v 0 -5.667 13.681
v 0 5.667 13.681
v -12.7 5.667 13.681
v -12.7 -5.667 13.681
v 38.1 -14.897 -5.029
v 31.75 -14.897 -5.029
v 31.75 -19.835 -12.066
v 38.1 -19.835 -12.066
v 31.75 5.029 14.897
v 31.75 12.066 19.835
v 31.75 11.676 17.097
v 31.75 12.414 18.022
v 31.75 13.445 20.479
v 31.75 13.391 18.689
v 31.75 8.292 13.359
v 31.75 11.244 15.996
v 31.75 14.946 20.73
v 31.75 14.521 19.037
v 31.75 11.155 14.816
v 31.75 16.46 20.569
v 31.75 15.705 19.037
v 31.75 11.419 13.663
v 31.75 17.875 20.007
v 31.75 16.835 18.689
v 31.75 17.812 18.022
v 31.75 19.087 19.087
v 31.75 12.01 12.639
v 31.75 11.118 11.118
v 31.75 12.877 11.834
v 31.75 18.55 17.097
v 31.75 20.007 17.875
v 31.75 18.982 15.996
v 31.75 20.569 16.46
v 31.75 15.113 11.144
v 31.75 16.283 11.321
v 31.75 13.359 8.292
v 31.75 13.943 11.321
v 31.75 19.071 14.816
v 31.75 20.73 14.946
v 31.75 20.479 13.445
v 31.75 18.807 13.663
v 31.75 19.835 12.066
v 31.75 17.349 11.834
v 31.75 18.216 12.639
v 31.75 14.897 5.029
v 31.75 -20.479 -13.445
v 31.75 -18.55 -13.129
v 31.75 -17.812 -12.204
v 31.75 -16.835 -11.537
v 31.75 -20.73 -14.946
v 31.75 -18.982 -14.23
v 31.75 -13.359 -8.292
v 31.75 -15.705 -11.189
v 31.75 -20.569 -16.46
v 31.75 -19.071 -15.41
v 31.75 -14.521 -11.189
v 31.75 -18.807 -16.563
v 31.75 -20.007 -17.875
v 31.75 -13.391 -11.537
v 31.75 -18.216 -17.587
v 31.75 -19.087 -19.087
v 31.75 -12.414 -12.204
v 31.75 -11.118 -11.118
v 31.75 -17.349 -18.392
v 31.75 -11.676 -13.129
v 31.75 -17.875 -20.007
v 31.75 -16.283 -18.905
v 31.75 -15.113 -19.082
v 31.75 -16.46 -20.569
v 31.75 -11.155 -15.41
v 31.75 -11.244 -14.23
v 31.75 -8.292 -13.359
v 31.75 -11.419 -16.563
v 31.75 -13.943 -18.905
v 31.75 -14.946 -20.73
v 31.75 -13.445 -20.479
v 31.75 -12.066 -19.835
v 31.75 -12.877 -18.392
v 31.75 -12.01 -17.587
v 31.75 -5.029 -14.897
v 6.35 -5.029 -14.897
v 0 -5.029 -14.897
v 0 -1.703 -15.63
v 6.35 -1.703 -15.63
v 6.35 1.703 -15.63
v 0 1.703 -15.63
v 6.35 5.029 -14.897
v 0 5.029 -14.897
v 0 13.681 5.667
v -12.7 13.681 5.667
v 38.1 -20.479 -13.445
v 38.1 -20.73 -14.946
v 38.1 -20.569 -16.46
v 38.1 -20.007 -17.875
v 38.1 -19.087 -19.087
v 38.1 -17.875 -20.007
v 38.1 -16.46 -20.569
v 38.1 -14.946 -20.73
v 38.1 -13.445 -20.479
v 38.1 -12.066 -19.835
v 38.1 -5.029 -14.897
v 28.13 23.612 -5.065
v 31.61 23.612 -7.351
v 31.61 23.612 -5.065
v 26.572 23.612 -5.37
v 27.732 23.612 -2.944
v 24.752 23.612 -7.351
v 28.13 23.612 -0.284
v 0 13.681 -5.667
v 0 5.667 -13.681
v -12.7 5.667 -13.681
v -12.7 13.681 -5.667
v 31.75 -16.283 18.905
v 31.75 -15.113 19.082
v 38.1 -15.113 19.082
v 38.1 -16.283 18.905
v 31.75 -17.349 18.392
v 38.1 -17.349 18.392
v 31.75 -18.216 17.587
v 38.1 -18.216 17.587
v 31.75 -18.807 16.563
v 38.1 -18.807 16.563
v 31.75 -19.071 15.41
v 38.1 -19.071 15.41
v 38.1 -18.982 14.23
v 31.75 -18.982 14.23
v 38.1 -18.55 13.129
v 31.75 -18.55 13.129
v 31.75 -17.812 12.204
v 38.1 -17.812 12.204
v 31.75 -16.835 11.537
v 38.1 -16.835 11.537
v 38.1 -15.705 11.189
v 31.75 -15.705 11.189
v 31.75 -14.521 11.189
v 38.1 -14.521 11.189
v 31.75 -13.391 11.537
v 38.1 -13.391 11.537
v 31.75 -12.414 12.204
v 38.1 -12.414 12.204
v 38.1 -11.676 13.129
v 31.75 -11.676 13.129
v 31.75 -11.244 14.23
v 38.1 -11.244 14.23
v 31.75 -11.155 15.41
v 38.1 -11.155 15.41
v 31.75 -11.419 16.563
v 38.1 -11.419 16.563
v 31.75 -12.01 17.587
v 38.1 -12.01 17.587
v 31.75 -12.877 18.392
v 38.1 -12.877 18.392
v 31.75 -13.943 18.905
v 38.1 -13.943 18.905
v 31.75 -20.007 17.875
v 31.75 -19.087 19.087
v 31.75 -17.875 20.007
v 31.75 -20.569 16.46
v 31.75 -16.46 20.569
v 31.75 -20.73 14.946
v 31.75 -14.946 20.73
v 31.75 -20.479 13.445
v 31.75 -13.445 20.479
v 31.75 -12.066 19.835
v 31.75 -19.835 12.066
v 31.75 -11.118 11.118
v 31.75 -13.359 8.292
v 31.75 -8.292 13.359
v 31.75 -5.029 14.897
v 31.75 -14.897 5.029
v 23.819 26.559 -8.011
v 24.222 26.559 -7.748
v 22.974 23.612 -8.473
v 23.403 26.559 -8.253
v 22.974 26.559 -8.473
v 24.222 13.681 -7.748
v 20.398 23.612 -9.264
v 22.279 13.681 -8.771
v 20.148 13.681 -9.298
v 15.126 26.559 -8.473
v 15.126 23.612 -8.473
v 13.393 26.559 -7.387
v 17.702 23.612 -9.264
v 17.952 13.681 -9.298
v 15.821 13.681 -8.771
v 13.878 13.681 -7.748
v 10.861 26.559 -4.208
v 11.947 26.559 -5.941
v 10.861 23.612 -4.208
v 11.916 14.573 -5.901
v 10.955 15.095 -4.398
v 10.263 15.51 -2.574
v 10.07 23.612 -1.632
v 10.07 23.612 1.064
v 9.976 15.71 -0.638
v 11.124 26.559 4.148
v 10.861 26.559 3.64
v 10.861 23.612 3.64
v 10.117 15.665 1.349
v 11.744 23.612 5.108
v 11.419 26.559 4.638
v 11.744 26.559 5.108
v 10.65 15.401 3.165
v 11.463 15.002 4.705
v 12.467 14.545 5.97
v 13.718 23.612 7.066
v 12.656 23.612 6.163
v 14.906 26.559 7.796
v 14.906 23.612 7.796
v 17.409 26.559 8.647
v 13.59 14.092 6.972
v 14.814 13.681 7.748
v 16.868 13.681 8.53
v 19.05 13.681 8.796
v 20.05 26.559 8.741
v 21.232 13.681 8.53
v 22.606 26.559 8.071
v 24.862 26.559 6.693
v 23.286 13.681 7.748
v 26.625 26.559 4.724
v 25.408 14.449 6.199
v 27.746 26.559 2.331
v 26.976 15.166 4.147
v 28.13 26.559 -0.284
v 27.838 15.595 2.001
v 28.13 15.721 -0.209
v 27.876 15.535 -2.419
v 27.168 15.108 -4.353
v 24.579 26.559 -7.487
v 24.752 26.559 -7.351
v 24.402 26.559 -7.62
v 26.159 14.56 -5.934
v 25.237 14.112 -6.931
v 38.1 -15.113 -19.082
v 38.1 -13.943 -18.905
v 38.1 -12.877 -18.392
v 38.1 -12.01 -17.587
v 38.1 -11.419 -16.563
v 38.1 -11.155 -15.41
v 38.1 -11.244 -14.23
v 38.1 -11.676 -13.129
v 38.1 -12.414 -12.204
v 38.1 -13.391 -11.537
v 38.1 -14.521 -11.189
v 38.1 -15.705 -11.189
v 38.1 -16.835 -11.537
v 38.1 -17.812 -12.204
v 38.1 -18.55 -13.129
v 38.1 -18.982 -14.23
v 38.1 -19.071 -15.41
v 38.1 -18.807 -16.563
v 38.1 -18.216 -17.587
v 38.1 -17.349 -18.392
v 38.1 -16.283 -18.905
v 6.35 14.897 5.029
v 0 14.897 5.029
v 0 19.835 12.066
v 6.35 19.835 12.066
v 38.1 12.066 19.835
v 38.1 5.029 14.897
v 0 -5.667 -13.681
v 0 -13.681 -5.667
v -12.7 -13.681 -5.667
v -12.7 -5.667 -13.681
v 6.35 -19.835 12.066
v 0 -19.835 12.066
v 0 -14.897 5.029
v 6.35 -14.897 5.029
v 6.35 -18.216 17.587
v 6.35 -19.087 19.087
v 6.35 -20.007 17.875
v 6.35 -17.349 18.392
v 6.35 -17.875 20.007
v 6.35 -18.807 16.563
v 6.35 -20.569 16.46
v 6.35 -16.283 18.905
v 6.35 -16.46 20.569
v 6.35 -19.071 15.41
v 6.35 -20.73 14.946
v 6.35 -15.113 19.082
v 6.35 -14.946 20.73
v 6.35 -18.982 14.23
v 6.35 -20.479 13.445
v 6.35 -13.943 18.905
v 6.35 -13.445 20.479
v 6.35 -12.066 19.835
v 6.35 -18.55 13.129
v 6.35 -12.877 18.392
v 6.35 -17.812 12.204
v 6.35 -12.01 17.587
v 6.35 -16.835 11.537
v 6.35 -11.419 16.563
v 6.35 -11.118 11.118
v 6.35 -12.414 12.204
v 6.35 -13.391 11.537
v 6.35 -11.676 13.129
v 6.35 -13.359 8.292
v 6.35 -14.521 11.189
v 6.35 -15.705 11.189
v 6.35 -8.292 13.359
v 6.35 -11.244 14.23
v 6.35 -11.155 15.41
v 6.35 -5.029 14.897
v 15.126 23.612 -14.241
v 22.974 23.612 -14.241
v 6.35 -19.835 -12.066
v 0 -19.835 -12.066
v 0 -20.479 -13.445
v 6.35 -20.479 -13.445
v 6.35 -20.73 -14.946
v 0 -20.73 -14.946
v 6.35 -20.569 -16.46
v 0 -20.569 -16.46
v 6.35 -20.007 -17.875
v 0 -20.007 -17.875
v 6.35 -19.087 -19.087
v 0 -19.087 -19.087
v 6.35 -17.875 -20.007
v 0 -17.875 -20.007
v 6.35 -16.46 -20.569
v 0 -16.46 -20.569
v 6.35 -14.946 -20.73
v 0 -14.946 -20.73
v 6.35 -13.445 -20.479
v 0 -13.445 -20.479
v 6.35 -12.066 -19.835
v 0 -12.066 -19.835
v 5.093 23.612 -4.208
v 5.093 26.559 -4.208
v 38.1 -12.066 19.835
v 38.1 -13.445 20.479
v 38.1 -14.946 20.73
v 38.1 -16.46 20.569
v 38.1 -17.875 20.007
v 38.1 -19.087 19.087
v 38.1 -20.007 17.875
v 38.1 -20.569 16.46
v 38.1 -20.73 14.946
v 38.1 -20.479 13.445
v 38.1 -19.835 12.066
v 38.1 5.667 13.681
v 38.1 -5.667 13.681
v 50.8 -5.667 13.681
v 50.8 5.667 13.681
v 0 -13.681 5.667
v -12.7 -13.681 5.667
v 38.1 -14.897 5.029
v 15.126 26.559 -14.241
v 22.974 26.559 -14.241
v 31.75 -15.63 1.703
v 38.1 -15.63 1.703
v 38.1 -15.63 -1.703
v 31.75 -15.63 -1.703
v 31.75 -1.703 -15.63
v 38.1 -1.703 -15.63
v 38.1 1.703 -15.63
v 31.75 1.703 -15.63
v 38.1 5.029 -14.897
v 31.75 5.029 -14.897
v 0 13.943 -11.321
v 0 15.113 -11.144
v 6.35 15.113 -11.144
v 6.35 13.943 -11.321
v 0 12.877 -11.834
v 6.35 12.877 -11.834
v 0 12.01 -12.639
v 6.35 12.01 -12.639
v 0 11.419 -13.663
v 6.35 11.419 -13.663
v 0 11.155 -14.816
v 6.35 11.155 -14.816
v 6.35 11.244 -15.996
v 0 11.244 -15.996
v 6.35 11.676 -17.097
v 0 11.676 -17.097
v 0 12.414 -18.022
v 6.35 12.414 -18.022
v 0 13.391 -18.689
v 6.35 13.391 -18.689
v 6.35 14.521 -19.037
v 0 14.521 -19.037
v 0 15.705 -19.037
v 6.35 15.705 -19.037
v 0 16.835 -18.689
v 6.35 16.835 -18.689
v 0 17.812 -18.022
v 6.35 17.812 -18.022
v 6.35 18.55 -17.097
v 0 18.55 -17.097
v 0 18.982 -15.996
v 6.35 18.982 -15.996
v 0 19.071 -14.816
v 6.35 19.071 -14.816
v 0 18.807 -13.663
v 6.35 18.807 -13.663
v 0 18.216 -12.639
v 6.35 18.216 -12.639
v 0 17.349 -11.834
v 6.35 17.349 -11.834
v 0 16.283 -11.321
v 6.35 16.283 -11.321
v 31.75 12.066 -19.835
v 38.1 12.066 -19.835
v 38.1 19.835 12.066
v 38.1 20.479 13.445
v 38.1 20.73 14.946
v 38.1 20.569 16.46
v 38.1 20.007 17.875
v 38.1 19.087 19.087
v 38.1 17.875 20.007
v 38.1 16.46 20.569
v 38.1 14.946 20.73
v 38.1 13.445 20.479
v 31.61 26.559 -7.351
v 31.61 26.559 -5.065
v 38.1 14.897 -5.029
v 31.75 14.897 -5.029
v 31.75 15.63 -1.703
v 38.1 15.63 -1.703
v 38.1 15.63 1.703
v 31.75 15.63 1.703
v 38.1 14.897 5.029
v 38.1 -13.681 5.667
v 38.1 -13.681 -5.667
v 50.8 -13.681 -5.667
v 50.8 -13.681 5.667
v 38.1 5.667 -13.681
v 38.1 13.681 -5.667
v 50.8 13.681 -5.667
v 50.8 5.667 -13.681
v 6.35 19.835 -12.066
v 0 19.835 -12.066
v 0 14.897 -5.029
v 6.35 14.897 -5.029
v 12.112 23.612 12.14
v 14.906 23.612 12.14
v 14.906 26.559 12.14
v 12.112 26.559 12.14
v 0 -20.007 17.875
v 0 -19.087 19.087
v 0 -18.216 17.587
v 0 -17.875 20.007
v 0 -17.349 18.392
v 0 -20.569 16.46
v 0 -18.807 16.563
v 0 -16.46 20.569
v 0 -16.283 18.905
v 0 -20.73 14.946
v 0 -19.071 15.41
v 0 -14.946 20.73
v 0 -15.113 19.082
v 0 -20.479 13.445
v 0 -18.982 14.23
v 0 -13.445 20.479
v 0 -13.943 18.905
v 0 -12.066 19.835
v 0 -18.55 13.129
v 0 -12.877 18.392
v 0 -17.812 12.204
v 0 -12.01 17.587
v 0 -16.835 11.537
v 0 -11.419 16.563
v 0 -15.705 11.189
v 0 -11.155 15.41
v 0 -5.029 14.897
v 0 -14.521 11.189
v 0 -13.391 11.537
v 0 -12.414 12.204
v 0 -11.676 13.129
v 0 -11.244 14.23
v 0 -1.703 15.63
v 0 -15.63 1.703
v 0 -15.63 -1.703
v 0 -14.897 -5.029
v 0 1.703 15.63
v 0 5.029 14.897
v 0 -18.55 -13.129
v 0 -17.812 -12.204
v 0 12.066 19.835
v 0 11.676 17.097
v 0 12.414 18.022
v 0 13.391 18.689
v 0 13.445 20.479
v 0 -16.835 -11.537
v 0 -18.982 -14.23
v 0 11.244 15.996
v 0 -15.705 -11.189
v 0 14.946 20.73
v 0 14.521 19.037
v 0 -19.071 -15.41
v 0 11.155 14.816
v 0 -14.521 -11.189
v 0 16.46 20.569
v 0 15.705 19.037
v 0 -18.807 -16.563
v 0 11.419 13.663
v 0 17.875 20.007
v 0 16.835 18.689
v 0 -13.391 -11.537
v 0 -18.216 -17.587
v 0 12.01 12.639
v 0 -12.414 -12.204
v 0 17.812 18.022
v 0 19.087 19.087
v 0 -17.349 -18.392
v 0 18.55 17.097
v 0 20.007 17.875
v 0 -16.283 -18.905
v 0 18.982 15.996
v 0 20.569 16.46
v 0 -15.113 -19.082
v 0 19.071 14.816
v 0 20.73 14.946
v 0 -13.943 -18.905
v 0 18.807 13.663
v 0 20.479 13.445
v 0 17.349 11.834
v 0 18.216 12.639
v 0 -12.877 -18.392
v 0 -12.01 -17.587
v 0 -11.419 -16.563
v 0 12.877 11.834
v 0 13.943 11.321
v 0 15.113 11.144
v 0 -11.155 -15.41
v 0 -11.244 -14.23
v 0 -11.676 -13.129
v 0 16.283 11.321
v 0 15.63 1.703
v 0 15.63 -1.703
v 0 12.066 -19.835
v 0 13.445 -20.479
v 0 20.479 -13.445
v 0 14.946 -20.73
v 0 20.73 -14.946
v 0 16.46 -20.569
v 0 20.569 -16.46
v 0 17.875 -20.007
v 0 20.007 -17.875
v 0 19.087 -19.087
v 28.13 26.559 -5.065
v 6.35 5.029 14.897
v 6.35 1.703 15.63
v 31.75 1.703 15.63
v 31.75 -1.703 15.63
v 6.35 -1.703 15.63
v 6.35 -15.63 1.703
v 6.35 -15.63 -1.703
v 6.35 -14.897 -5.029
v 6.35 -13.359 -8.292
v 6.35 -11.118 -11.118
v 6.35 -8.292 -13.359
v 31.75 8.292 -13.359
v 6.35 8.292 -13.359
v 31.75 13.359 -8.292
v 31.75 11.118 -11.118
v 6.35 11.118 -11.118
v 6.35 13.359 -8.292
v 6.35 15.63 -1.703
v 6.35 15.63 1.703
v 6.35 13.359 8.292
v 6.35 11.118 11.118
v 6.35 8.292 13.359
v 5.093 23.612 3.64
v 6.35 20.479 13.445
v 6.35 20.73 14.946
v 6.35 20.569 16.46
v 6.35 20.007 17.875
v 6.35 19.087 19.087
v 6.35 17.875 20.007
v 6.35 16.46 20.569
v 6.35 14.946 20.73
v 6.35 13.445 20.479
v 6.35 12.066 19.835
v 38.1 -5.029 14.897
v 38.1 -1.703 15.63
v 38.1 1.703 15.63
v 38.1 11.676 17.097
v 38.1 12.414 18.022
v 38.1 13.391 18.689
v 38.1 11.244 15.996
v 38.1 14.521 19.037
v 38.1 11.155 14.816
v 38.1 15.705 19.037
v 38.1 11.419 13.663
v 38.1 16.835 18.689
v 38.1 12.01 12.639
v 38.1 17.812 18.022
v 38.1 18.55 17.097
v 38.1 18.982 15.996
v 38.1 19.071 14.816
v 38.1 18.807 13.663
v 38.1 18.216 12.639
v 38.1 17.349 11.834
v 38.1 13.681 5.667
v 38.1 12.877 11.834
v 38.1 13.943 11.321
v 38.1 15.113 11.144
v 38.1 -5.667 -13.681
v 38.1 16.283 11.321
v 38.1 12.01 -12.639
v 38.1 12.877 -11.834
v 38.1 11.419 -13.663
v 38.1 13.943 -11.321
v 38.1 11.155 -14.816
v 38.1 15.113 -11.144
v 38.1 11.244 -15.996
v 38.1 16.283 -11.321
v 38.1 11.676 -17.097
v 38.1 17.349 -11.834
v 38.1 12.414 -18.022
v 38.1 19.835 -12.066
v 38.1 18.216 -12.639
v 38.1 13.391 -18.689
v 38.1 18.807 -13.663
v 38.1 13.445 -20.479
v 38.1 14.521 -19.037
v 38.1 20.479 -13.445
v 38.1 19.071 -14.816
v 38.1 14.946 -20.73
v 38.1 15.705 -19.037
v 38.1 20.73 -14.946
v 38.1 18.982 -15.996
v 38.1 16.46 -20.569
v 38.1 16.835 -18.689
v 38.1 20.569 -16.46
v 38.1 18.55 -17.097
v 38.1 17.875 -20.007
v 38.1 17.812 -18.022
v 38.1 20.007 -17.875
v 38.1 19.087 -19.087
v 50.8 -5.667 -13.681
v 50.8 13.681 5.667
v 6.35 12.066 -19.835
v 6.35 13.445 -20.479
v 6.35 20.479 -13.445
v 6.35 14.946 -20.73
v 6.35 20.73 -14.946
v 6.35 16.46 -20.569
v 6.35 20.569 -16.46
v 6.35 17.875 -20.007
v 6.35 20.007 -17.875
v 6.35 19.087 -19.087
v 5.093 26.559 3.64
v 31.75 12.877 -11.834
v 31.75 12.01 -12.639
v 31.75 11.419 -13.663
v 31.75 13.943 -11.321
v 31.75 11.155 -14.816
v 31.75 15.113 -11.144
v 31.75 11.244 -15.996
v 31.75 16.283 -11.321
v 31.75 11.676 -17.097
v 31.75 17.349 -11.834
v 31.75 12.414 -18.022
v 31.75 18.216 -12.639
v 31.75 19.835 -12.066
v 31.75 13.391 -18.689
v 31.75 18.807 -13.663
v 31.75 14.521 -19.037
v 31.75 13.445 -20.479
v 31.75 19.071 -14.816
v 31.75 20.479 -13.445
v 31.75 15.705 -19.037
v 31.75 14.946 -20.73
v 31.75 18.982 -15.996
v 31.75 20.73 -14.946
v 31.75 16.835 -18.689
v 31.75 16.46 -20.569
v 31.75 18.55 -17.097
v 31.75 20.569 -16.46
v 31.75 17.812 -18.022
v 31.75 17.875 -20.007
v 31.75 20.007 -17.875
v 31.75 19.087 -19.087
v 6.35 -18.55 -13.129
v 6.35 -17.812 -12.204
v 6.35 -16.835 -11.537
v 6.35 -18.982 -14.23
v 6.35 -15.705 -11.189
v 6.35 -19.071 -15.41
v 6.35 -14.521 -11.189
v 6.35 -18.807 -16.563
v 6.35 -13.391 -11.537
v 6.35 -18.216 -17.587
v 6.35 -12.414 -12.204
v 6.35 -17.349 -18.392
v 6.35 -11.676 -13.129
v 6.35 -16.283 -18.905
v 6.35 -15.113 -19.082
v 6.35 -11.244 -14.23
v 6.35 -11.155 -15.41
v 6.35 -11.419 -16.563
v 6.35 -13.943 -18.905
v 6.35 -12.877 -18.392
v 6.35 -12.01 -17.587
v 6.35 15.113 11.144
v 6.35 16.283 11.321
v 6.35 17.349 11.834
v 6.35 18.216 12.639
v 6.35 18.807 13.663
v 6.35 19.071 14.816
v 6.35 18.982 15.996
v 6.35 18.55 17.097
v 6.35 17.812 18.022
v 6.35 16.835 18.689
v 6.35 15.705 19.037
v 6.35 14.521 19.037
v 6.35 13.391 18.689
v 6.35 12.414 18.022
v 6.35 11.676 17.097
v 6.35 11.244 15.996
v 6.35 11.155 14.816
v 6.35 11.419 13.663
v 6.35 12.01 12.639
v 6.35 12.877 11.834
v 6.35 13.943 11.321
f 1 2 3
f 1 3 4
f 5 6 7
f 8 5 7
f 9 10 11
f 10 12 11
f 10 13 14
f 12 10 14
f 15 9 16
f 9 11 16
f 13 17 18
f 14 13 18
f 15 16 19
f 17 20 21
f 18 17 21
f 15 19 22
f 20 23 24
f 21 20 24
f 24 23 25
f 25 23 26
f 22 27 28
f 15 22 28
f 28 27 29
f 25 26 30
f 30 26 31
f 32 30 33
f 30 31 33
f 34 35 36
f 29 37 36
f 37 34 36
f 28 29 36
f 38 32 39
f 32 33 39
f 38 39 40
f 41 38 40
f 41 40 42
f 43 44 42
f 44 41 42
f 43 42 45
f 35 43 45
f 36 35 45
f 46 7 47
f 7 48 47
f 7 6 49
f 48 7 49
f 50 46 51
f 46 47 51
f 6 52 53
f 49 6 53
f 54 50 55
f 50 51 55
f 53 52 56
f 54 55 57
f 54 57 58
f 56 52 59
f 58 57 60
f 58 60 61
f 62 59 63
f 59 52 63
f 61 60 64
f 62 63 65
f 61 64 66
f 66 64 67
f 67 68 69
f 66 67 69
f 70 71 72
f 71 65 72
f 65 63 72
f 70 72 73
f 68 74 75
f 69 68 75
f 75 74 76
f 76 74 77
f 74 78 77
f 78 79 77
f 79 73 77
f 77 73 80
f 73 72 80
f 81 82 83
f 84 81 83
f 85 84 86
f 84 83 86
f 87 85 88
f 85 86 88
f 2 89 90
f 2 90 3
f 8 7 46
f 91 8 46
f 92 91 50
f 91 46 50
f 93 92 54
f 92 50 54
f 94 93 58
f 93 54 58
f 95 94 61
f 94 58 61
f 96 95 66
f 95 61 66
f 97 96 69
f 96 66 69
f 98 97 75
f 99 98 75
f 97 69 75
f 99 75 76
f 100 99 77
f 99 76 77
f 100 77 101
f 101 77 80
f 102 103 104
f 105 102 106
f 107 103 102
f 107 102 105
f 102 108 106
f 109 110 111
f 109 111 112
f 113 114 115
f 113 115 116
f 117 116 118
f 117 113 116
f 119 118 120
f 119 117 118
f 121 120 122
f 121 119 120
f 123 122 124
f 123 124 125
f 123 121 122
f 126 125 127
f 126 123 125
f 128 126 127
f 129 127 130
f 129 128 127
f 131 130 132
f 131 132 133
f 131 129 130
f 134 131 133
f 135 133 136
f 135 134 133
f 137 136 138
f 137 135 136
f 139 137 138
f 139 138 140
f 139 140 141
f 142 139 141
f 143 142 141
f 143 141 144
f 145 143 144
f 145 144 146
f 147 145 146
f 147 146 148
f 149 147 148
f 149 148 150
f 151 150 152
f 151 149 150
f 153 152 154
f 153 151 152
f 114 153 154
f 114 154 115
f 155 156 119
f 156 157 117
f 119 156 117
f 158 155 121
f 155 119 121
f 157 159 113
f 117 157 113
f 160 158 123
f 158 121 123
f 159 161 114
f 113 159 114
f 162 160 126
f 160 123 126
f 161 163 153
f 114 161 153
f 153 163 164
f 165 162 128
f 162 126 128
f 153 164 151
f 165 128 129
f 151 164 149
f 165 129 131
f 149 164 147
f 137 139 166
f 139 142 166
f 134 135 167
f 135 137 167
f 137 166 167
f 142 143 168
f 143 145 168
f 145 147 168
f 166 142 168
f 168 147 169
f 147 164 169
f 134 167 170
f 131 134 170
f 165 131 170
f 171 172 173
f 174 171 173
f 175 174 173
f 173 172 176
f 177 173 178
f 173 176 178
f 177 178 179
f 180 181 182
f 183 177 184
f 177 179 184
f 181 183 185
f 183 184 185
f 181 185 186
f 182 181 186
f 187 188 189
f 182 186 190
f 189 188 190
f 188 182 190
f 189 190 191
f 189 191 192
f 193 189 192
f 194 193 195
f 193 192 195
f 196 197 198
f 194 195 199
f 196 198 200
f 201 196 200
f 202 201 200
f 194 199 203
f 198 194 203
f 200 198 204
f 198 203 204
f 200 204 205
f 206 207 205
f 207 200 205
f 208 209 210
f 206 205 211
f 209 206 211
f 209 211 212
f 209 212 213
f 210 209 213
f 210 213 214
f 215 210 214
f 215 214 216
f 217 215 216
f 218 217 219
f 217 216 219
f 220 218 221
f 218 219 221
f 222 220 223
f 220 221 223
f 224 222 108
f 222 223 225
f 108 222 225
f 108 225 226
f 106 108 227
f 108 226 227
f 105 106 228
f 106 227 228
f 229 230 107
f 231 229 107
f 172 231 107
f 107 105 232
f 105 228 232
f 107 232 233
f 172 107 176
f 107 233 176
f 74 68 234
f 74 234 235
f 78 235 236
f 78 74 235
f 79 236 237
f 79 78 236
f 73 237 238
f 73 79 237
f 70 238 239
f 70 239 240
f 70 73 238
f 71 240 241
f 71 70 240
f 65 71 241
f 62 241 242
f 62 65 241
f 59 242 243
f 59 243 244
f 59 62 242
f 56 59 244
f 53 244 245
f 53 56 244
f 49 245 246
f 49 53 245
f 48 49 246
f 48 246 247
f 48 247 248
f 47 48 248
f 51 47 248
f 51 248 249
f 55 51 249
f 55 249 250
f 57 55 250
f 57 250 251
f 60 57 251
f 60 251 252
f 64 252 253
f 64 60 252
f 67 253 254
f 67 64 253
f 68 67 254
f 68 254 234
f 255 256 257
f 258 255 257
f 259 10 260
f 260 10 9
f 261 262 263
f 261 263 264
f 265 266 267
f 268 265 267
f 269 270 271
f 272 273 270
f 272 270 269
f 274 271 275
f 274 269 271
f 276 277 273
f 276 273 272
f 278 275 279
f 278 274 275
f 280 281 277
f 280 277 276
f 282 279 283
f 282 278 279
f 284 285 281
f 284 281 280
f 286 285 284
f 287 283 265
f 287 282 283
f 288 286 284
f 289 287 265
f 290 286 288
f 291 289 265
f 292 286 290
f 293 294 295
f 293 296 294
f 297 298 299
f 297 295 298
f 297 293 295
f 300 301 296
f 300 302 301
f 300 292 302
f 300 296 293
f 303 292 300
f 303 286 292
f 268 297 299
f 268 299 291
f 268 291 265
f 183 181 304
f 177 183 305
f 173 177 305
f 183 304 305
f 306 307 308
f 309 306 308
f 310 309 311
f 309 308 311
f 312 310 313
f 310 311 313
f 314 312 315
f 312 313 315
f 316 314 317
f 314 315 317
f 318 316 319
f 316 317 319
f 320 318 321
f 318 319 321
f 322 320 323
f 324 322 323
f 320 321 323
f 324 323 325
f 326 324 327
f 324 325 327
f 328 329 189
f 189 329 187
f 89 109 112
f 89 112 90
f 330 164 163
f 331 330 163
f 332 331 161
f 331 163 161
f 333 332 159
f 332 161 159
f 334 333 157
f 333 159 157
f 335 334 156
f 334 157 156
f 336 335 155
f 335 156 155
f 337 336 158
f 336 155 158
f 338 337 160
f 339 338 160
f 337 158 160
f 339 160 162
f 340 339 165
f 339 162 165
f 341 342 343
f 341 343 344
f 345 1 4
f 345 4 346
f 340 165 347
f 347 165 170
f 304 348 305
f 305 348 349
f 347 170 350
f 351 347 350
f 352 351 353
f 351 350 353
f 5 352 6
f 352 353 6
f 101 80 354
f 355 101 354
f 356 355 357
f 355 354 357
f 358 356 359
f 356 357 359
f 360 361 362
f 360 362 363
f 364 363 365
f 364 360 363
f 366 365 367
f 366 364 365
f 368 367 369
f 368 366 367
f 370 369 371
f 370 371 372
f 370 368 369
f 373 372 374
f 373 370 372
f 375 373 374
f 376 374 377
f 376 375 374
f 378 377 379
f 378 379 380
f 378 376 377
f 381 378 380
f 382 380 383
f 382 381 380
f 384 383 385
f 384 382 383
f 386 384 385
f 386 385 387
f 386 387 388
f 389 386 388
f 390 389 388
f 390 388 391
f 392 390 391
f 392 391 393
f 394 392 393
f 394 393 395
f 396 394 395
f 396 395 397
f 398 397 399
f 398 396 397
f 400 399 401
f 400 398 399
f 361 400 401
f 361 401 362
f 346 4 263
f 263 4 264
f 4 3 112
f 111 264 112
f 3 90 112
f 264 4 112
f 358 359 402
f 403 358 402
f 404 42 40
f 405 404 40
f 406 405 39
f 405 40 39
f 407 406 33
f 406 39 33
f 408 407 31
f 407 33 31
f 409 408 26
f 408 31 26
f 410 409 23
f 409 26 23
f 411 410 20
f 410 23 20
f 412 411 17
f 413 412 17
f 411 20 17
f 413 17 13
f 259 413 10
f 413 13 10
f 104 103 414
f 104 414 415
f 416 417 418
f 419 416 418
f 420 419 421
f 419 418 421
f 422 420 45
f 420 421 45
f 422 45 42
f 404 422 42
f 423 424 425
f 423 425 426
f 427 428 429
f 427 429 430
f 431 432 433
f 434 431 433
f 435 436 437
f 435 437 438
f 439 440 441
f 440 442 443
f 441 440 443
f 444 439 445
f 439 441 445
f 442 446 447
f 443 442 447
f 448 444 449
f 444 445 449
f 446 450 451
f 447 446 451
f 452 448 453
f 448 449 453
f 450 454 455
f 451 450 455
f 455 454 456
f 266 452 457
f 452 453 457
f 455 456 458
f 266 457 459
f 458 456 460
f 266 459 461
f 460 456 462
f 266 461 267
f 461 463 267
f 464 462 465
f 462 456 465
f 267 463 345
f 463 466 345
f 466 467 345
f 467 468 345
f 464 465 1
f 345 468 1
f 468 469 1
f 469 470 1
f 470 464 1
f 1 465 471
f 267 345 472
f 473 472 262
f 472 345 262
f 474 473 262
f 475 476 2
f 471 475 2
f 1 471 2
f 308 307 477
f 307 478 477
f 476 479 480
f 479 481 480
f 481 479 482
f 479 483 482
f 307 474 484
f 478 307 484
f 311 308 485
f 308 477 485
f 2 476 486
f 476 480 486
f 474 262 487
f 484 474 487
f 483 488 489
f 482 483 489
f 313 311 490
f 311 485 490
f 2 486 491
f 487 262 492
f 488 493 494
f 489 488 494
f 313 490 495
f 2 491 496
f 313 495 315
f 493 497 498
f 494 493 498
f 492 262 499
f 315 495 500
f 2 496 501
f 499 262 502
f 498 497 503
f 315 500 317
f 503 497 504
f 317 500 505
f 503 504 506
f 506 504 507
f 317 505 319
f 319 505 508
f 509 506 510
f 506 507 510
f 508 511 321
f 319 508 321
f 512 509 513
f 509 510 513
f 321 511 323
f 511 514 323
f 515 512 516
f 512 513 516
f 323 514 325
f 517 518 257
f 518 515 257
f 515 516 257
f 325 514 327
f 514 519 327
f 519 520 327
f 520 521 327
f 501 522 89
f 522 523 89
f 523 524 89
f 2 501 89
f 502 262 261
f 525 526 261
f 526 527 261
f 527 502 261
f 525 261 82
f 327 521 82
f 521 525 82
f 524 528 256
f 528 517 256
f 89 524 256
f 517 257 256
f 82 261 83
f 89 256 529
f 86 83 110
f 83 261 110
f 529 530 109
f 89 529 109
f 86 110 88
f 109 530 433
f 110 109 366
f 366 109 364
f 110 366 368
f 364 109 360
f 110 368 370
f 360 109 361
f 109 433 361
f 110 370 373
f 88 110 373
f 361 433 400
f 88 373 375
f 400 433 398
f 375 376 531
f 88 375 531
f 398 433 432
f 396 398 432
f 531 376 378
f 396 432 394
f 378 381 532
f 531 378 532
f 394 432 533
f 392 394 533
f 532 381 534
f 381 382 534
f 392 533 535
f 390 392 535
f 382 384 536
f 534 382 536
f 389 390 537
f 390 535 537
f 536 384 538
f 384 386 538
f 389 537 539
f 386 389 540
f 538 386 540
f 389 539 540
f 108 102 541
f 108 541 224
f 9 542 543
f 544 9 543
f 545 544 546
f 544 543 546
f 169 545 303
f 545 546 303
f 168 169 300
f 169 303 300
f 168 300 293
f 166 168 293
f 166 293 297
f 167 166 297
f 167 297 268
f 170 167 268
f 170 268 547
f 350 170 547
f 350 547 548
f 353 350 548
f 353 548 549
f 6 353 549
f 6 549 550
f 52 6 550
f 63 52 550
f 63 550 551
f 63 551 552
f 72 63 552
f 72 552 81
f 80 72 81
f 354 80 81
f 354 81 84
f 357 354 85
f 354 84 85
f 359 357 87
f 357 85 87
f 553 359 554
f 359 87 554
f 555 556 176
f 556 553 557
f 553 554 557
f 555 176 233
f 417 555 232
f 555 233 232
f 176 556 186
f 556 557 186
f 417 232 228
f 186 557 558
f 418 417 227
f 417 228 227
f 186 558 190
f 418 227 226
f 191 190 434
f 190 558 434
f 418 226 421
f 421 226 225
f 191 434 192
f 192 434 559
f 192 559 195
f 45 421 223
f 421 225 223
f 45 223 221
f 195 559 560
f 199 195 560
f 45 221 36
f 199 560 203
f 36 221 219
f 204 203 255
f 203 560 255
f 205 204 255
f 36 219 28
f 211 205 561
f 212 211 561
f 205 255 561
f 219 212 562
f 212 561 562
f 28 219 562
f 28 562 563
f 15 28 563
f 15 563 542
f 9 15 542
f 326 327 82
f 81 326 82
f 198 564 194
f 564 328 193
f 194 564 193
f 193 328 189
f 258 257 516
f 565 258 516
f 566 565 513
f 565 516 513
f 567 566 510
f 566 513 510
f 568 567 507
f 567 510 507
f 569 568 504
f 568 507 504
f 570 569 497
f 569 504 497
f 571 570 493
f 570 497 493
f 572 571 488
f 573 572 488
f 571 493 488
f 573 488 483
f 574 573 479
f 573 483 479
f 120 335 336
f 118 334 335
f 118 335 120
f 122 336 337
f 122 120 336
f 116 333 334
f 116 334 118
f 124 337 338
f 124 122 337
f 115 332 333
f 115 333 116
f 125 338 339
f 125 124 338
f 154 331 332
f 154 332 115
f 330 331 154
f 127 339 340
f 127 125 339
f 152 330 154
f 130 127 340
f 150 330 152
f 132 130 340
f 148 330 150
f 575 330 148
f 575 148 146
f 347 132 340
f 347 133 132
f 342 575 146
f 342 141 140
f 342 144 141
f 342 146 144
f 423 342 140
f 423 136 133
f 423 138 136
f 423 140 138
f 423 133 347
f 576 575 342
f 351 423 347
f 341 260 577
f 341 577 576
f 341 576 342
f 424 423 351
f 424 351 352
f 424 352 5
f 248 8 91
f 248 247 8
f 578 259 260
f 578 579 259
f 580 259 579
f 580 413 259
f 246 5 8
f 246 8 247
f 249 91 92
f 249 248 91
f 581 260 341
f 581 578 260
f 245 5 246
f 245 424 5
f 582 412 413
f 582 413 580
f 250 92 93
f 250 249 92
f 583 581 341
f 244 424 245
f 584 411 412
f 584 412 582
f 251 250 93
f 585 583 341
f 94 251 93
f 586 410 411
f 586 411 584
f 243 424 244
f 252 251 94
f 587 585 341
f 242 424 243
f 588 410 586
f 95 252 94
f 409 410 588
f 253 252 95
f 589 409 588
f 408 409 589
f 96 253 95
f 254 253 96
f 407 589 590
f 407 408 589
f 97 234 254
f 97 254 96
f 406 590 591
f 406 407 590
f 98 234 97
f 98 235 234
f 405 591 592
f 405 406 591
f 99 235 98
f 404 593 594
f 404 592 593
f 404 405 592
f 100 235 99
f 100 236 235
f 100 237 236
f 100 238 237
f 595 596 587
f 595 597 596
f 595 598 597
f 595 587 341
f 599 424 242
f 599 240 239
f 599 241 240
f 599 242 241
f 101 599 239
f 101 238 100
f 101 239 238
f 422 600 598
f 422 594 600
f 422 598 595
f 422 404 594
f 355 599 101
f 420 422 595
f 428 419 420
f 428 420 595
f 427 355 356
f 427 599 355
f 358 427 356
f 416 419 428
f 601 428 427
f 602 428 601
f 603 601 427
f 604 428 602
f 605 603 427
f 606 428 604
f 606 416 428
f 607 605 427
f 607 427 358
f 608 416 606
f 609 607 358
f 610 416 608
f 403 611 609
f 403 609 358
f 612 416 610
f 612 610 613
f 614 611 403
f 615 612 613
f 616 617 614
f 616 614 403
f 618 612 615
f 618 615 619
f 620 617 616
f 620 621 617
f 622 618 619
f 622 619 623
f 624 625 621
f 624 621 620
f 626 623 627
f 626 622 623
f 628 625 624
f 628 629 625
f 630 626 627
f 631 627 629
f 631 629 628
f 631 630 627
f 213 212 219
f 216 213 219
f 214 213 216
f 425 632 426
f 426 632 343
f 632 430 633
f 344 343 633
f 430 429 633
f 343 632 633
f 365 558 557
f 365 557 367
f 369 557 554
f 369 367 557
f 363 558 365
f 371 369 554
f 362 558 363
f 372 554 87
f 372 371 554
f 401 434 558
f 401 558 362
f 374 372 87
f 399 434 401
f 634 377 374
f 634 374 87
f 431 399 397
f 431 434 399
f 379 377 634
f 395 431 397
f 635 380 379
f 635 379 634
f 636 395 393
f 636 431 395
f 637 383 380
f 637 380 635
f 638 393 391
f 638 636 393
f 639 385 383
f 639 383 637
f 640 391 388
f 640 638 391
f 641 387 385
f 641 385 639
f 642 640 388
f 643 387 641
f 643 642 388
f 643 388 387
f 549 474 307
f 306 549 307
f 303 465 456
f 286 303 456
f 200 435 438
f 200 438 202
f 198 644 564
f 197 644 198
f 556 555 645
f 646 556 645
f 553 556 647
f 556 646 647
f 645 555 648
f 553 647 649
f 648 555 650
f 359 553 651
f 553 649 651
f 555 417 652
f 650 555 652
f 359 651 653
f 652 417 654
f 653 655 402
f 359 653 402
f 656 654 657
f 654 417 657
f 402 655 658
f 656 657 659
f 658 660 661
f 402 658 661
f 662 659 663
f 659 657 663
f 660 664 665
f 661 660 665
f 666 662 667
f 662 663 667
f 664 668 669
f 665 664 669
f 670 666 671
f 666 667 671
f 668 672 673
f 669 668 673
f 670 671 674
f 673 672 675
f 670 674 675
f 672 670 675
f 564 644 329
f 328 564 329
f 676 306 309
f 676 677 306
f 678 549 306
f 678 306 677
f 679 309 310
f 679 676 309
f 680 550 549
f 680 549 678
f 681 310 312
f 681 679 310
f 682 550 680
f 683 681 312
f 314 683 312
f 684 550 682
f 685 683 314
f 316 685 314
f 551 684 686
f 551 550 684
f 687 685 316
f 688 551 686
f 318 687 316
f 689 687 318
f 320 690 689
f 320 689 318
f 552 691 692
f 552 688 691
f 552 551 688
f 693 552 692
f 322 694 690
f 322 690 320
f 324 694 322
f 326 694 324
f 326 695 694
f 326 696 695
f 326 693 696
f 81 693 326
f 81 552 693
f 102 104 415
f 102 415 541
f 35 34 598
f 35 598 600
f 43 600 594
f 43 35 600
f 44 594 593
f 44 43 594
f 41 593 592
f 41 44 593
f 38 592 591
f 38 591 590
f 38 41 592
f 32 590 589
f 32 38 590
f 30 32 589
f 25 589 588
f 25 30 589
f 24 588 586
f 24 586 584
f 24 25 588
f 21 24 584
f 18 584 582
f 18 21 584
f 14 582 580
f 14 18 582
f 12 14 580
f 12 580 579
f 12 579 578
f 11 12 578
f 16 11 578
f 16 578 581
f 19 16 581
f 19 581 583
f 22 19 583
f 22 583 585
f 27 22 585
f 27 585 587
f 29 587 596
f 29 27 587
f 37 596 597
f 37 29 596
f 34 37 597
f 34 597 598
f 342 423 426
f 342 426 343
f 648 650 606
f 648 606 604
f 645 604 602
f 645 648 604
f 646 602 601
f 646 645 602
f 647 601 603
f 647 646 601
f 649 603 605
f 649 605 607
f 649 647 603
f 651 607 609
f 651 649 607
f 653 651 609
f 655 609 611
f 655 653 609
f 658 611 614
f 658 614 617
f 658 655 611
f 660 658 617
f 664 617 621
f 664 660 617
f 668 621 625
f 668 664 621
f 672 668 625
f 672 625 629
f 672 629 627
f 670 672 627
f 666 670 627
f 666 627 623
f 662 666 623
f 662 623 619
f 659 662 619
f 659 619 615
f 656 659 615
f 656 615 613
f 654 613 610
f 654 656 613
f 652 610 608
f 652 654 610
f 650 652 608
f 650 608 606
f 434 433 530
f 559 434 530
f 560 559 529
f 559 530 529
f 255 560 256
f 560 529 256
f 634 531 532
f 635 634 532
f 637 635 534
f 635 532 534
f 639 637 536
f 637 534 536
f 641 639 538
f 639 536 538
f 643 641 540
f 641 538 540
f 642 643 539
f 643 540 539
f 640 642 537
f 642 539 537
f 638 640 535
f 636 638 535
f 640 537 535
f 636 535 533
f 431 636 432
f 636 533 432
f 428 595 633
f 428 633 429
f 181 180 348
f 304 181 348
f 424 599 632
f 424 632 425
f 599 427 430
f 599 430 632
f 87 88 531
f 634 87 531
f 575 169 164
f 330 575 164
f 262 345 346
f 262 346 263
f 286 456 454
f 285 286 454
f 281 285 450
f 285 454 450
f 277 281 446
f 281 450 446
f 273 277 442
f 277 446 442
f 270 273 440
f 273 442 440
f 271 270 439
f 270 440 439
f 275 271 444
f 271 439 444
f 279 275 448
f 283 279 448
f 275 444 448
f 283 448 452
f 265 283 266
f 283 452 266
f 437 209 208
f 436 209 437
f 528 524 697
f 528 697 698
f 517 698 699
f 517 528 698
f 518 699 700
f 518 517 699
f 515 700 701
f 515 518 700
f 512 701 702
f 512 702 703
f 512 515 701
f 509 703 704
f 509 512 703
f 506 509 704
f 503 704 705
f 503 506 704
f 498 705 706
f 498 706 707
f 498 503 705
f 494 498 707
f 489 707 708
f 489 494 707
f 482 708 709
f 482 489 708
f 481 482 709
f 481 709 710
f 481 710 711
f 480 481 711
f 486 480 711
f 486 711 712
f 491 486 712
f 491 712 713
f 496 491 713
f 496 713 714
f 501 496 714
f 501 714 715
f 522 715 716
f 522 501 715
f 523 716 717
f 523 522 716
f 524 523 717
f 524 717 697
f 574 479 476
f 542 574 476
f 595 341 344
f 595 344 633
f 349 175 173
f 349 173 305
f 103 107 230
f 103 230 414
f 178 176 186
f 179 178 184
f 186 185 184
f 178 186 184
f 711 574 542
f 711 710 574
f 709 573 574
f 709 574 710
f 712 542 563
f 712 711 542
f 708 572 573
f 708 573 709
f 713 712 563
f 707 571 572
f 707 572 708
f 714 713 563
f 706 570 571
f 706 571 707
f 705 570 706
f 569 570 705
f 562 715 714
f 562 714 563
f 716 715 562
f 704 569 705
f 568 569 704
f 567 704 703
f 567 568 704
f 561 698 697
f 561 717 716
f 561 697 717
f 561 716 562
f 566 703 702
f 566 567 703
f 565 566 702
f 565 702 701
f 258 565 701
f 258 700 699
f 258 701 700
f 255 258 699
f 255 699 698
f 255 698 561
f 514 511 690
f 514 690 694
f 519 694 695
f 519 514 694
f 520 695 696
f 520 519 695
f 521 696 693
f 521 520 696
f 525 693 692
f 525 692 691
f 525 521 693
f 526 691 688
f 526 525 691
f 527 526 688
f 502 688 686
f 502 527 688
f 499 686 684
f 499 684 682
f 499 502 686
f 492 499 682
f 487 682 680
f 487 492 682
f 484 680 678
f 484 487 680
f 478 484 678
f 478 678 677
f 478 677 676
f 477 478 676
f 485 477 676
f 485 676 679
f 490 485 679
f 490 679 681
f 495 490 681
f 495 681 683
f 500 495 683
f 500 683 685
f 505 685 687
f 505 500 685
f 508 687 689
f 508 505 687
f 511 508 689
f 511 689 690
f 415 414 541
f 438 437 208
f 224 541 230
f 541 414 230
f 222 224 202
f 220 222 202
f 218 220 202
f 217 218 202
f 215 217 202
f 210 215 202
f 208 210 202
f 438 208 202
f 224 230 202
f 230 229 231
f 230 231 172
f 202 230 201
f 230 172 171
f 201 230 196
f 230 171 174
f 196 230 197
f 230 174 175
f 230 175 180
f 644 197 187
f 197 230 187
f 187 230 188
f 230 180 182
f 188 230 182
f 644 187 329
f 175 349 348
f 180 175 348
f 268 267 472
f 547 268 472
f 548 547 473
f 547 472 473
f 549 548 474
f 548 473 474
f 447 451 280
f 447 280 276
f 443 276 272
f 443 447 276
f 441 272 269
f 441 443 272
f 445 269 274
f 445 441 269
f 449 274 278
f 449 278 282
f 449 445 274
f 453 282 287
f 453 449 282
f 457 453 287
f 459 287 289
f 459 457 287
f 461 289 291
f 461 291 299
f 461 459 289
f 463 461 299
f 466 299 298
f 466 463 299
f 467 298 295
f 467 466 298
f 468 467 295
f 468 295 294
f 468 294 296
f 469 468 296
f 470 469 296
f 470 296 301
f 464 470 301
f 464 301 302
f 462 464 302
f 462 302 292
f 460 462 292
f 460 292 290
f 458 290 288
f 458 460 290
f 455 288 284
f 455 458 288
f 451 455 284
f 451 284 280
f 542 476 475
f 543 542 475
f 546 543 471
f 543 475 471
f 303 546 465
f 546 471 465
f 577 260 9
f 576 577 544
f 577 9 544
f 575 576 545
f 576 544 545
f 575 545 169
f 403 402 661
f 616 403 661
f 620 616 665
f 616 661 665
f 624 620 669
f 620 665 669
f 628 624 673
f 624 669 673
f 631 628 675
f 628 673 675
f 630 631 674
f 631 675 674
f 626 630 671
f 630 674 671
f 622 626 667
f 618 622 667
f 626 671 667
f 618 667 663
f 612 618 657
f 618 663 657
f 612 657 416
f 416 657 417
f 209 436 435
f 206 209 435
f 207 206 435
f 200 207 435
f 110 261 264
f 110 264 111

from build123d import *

# Parameters (mm, degrees)
SKETCH1_R            = 3.96875
BOSS_EXTRUDE2_DEPTH  = 6.35
BOSS_EXTRUDE3_DEPTH  = 12.7
SKETCH3_R            = 15.7226
BOSS_EXTRUDE4_DEPTH  = 25.4
SKETCH4_R            = 3.96875
BOSS_EXTRUDE5_DEPTH  = 6.35
BOSS_EXTRUDE6_DEPTH  = 12.7
SKETCH6_R            = 9.0805
BOSS_EXTRUDE8_DEPTH  = 12.8778
SKETCH8_W            = 7.8486
SKETCH8_H            = 8.0772
SKETCH8_W_2          = 8.0772
SKETCH8_H_2          = 7.8486
BOSS_EXTRUDE9_DEPTH  = 2.9464
BOSS_EXTRUDE10_START = -2.9464
BOSS_EXTRUDE10_DEPTH = 2.9464


with BuildPart() as part:
    # Sketch1 → Boss-Extrude2 (new body)
    with BuildSketch(Plane(origin=(0, 0, 0), x_dir=(0, 0, -1), z_dir=(1, 0, 0))):
        with BuildLine():
            Line((-19.834703053, 12.065523939), (-14.896576623, 5.029130709))
            ThreePointArc((-14.896576623, 5.029130709), (-15.7226, 0), (-14.896576623, -5.029130709))
            Line((-14.896576623, -5.029130709), (-19.834703053, -12.065523939))
            ThreePointArc((-19.834703053, -12.065523939), (-19.086763334, -19.086763334), (-12.065523939, -19.834703053))
            Line((-12.065523939, -19.834703053), (-5.029130709, -14.896576623))
            ThreePointArc((-5.029130709, -14.896576623), (0, -15.7226), (5.029130709, -14.896576623))
            Line((5.029130709, -14.896576623), (12.065523939, -19.834703053))
            ThreePointArc((12.065523939, -19.834703053), (19.086763334, -19.086763334), (19.834703053, -12.065523939))
            Line((19.834703053, -12.065523939), (14.896576623, -5.029130709))
            ThreePointArc((14.896576623, -5.029130709), (15.7226, 0), (14.896576623, 5.029130709))
            Line((14.896576623, 5.029130709), (19.834703053, 12.065523939))
            ThreePointArc((19.834703053, 12.065523939), (19.086763334, 19.086763334), (12.065523939, 19.834703053))
            Line((12.065523939, 19.834703053), (5.029130709, 14.896576623))
            ThreePointArc((5.029130709, 14.896576623), (0, 15.7226), (-5.029130709, 14.896576623))
            Line((-5.029130709, 14.896576623), (-12.065523939, 19.834703053))
            ThreePointArc((-12.065523939, 19.834703053), (-19.086763334, 19.086763334), (-19.834703053, 12.065523939))
        make_face()
        with Locations((-15.113, 15.113)):
            Circle(SKETCH1_R, mode=Mode.SUBTRACT)
        with Locations(Location((15.113, 15.113, 0), (0, 0, 180))):
            Circle(SKETCH1_R, mode=Mode.SUBTRACT)
        with Locations((15.113, -15.113)):
            Circle(SKETCH1_R, mode=Mode.SUBTRACT)
        with Locations(Location((-15.113, -15.113, 0), (0, 0, 180))):
            Circle(SKETCH1_R, mode=Mode.SUBTRACT)
    extrude(amount=BOSS_EXTRUDE2_DEPTH)

    # Sketch2 → Boss-Extrude3 (add)
    with BuildSketch(Plane.ZY):
        Polygon((13.680992893, 5.666852803), (13.680992893, -5.666852803), (5.666852803, -13.680992893), (-5.666852803, -13.680992893), (-13.680992893, -5.666852803), (-13.680992893, 5.666852803), (-5.666852803, 13.680992893), (5.666852803, 13.680992893), align=None)
    extrude(amount=BOSS_EXTRUDE3_DEPTH)

    # Sketch3 → Boss-Extrude4 (add)
    with BuildSketch(Plane(origin=(6.35, 0, 0), x_dir=(0, 0, -1), z_dir=(1, 0, 0))):
        with Locations(Location((0, 0, 0), (0, 0, 161.345157372))):
            Circle(SKETCH3_R)
    extrude(amount=BOSS_EXTRUDE4_DEPTH)

    # Sketch4 → Boss-Extrude5 (add)
    with BuildSketch(Plane(origin=(31.75, 0, 0), x_dir=(0, 0, -1), z_dir=(1, 0, 0))):
        with BuildLine():
            Line((-19.834703053, 12.065523939), (-14.896576623, 5.029130709))
            ThreePointArc((-14.896576623, 5.029130709), (-15.7226, 0), (-14.896576623, -5.029130709))
            Line((-14.896576623, -5.029130709), (-19.834703053, -12.065523939))
            ThreePointArc((-19.834703053, -12.065523939), (-19.086763334, -19.086763334), (-12.065523939, -19.834703053))
            Line((-12.065523939, -19.834703053), (-5.029130709, -14.896576623))
            ThreePointArc((-5.029130709, -14.896576623), (0, -15.7226), (5.029130709, -14.896576623))
            Line((5.029130709, -14.896576623), (12.065523939, -19.834703053))
            ThreePointArc((12.065523939, -19.834703053), (19.086763334, -19.086763334), (19.834703053, -12.065523939))
            Line((19.834703053, -12.065523939), (14.896576623, -5.029130709))
            ThreePointArc((14.896576623, -5.029130709), (15.7226, 0), (14.896576623, 5.029130709))
            Line((14.896576623, 5.029130709), (19.834703053, 12.065523939))
            ThreePointArc((19.834703053, 12.065523939), (19.086763334, 19.086763334), (12.065523939, 19.834703053))
            Line((12.065523939, 19.834703053), (5.029130709, 14.896576623))
            ThreePointArc((5.029130709, 14.896576623), (0, 15.7226), (-5.029130709, 14.896576623))
            Line((-5.029130709, 14.896576623), (-12.065523939, 19.834703053))
            ThreePointArc((-12.065523939, 19.834703053), (-19.086763334, 19.086763334), (-19.834703053, 12.065523939))
        make_face()
        with Locations((-15.113, 15.113)):
            Circle(SKETCH4_R, mode=Mode.SUBTRACT)
        with Locations(Location((15.113, 15.113, 0), (0, 0, 180))):
            Circle(SKETCH4_R, mode=Mode.SUBTRACT)
        with Locations((15.113, -15.113)):
            Circle(SKETCH4_R, mode=Mode.SUBTRACT)
        with Locations(Location((-15.113, -15.113, 0), (0, 0, 180))):
            Circle(SKETCH4_R, mode=Mode.SUBTRACT)
    extrude(amount=BOSS_EXTRUDE5_DEPTH)

    # Sketch5 → Boss-Extrude6 (add)
    with BuildSketch(Plane(origin=(38.1, 0, 0), x_dir=(0, 0, -1), z_dir=(1, 0, 0))):
        Polygon((13.680992893, 5.666852803), (13.680992893, -5.666852803), (5.666852803, -13.680992893), (-5.666852803, -13.680992893), (-13.680992893, -5.666852803), (-13.680992893, 5.666852803), (-5.666852803, 13.680992893), (5.666852803, 13.680992893), align=None)
    extrude(amount=BOSS_EXTRUDE6_DEPTH)

    # Sketch6 → Boss-Extrude8 (add)
    with BuildSketch(Plane(origin=(0, 13.680992893, 0), x_dir=(1, 0, 0), z_dir=(0, 1, 0))):
        with Locations(Location((19.05, 0.284018035, 0), (0, 0, 55.282753466))):
            Circle(SKETCH6_R)
    extrude(amount=BOSS_EXTRUDE8_DEPTH)

    # Sketch8 → Boss-Extrude9 (add)
    with BuildSketch(Plane(origin=(0, 26.558792893, 0), x_dir=(1, 0, 0), z_dir=(0, 1, 0))):
        with Locations((19.05, 10.202718035)):
            Rectangle(SKETCH8_W, SKETCH8_H)
        with Locations((9.1313, 0.284018035)):
            Rectangle(SKETCH8_W_2, SKETCH8_H_2)
    extrude(amount=-BOSS_EXTRUDE9_DEPTH)

    # Sketch10 → Boss-Extrude10 (add)
    with BuildSketch(Plane(origin=(0, 26.558792893, 0), x_dir=(1, 0, 0), z_dir=(0, 1, 0)).offset(BOSS_EXTRUDE10_START)):
        with BuildLine():
            Line((24.7523, 7.350789218), (31.6103, 7.350789218))
            Line((31.6103, 7.350789218), (31.6103, 5.064789218))
            Line((31.6103, 5.064789218), (28.1305, 5.064789218))
            Line((28.1305, 5.064789218), (28.1305, 0.284018035))
            ThreePointArc((28.1305, 0.284018035), (23.784459378, -7.464554392), (14.90647607, -7.795999892))
            Line((14.90647607, -7.795999892), (14.90647607, -12.140453608))
            Line((14.90647607, -12.140453608), (12.11247607, -12.140453608))
            Line((12.11247607, -12.140453608), (11.743935589, -5.108282316))
            ThreePointArc((11.743935589, -5.108282316), (12.769066077, 6.841864427), (24.7523, 7.350789218))
        make_face()
    extrude(amount=BOSS_EXTRUDE10_DEPTH)


solid = part.part
